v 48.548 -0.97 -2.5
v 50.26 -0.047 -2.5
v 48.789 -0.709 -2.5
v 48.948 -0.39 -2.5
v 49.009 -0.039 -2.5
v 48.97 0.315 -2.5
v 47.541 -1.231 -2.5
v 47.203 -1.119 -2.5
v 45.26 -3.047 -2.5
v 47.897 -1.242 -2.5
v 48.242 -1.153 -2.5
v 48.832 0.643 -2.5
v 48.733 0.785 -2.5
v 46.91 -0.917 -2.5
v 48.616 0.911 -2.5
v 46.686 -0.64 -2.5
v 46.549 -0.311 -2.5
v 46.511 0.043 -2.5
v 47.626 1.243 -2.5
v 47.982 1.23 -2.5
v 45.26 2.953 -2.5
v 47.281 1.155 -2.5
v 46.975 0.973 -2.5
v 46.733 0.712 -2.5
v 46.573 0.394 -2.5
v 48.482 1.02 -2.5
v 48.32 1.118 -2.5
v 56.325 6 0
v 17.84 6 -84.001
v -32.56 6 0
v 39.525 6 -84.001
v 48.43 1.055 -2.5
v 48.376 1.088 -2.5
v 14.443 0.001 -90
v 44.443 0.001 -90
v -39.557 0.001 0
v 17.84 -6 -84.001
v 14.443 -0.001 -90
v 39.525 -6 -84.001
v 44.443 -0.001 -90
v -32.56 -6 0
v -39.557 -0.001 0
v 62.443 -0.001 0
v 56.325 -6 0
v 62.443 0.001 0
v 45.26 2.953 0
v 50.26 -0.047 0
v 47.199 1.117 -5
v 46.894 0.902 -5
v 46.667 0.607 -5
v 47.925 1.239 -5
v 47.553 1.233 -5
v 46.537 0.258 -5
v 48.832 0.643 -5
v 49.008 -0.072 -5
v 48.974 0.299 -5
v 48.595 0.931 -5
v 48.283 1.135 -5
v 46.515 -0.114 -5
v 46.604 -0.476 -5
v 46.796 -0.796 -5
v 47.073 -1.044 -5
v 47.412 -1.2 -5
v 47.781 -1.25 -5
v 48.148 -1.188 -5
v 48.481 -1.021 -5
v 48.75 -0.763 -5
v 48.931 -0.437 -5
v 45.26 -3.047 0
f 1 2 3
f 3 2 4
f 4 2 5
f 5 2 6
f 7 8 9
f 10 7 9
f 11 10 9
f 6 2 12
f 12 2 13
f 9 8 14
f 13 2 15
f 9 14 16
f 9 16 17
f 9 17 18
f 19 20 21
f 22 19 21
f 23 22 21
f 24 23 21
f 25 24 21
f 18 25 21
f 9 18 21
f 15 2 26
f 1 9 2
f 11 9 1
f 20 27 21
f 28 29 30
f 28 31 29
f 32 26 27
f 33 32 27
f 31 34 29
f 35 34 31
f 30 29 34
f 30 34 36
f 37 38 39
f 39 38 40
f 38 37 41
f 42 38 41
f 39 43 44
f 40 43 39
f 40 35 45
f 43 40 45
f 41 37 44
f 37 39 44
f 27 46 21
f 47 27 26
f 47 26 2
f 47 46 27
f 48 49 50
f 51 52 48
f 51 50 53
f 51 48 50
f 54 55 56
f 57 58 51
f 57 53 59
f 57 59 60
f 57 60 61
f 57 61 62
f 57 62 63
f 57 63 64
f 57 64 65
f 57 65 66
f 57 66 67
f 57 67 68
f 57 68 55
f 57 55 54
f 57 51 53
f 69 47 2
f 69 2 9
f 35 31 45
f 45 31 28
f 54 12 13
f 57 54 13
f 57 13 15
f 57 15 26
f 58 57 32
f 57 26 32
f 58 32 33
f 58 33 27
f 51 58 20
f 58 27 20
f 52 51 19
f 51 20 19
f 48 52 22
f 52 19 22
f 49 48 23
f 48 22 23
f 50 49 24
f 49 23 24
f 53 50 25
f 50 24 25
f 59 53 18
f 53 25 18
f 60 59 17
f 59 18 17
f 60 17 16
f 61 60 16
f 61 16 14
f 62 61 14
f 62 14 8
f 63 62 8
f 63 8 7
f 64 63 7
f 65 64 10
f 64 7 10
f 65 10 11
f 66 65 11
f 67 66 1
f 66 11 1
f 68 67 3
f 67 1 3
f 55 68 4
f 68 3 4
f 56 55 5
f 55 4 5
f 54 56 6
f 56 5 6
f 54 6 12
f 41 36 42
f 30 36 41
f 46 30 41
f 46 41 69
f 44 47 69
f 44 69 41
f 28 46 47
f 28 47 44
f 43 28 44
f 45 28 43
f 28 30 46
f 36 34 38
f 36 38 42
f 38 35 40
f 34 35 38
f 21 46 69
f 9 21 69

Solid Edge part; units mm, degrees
sketch "Sketch1" plane through (0, 0, 0) normal (0, -1, 0) x (1, 0, 0)
  line L0 (-39.5566, 0) -> (62.4434, 0)
  line L1 (50.4434, -60) -> (62.4434, 0)
  line L2 (50.4434, -60) -> (44.4434, -90)
  line L3 (38.4434, -90) -> (44.4434, -90)
  line L4 (38.4434, -90) -> (14.4434, -90)
  line L5 (14.4434, -90) -> (-39.5566, 0)
extrude "Protrusion1" add sketch "Sketch1" along normal mid plane 12
chamfer "Chamfer_1" distance 6 angle 45 2 edges at (-12.5566, 6, -45) (-12.5566, -6, -45)
chamfer "Chamfer_2" distance 6 angle 45 2 edges at (53.4434, 6, -45) (53.4434, -6, -45)
chamfer "Chamfer_3" distance 6 angle 45 2 edges at (29.8825, 6, -90) (29.8825, -6, -90)
sketch "Sketch2" plane through (11.4434, 0, 0) normal (0, 0, 1) x (1, 0, 0)
  line L0 (33.817, 2.9533) -> (38.817, -0.0467)
  line L1 (38.817, -0.0467) -> (33.817, -3.0467)
  line L2 (33.817, 2.9533) -> (33.817, -3.0467)
extrude "ExtrudedCutout_3" cut sketch "Sketch2" against normal blind 2.5
sketch "Sketch3" plane through (47.7603, -0.0467, -2.5) normal (0, 0, 1) x (0.8575, 0.5145, 0)
  circle A0 centre (0.0237, 0.0403) radius 1.25
extrude "ExtrudedCutout_4" cut sketch "Sketch3" against normal blind 2.5
